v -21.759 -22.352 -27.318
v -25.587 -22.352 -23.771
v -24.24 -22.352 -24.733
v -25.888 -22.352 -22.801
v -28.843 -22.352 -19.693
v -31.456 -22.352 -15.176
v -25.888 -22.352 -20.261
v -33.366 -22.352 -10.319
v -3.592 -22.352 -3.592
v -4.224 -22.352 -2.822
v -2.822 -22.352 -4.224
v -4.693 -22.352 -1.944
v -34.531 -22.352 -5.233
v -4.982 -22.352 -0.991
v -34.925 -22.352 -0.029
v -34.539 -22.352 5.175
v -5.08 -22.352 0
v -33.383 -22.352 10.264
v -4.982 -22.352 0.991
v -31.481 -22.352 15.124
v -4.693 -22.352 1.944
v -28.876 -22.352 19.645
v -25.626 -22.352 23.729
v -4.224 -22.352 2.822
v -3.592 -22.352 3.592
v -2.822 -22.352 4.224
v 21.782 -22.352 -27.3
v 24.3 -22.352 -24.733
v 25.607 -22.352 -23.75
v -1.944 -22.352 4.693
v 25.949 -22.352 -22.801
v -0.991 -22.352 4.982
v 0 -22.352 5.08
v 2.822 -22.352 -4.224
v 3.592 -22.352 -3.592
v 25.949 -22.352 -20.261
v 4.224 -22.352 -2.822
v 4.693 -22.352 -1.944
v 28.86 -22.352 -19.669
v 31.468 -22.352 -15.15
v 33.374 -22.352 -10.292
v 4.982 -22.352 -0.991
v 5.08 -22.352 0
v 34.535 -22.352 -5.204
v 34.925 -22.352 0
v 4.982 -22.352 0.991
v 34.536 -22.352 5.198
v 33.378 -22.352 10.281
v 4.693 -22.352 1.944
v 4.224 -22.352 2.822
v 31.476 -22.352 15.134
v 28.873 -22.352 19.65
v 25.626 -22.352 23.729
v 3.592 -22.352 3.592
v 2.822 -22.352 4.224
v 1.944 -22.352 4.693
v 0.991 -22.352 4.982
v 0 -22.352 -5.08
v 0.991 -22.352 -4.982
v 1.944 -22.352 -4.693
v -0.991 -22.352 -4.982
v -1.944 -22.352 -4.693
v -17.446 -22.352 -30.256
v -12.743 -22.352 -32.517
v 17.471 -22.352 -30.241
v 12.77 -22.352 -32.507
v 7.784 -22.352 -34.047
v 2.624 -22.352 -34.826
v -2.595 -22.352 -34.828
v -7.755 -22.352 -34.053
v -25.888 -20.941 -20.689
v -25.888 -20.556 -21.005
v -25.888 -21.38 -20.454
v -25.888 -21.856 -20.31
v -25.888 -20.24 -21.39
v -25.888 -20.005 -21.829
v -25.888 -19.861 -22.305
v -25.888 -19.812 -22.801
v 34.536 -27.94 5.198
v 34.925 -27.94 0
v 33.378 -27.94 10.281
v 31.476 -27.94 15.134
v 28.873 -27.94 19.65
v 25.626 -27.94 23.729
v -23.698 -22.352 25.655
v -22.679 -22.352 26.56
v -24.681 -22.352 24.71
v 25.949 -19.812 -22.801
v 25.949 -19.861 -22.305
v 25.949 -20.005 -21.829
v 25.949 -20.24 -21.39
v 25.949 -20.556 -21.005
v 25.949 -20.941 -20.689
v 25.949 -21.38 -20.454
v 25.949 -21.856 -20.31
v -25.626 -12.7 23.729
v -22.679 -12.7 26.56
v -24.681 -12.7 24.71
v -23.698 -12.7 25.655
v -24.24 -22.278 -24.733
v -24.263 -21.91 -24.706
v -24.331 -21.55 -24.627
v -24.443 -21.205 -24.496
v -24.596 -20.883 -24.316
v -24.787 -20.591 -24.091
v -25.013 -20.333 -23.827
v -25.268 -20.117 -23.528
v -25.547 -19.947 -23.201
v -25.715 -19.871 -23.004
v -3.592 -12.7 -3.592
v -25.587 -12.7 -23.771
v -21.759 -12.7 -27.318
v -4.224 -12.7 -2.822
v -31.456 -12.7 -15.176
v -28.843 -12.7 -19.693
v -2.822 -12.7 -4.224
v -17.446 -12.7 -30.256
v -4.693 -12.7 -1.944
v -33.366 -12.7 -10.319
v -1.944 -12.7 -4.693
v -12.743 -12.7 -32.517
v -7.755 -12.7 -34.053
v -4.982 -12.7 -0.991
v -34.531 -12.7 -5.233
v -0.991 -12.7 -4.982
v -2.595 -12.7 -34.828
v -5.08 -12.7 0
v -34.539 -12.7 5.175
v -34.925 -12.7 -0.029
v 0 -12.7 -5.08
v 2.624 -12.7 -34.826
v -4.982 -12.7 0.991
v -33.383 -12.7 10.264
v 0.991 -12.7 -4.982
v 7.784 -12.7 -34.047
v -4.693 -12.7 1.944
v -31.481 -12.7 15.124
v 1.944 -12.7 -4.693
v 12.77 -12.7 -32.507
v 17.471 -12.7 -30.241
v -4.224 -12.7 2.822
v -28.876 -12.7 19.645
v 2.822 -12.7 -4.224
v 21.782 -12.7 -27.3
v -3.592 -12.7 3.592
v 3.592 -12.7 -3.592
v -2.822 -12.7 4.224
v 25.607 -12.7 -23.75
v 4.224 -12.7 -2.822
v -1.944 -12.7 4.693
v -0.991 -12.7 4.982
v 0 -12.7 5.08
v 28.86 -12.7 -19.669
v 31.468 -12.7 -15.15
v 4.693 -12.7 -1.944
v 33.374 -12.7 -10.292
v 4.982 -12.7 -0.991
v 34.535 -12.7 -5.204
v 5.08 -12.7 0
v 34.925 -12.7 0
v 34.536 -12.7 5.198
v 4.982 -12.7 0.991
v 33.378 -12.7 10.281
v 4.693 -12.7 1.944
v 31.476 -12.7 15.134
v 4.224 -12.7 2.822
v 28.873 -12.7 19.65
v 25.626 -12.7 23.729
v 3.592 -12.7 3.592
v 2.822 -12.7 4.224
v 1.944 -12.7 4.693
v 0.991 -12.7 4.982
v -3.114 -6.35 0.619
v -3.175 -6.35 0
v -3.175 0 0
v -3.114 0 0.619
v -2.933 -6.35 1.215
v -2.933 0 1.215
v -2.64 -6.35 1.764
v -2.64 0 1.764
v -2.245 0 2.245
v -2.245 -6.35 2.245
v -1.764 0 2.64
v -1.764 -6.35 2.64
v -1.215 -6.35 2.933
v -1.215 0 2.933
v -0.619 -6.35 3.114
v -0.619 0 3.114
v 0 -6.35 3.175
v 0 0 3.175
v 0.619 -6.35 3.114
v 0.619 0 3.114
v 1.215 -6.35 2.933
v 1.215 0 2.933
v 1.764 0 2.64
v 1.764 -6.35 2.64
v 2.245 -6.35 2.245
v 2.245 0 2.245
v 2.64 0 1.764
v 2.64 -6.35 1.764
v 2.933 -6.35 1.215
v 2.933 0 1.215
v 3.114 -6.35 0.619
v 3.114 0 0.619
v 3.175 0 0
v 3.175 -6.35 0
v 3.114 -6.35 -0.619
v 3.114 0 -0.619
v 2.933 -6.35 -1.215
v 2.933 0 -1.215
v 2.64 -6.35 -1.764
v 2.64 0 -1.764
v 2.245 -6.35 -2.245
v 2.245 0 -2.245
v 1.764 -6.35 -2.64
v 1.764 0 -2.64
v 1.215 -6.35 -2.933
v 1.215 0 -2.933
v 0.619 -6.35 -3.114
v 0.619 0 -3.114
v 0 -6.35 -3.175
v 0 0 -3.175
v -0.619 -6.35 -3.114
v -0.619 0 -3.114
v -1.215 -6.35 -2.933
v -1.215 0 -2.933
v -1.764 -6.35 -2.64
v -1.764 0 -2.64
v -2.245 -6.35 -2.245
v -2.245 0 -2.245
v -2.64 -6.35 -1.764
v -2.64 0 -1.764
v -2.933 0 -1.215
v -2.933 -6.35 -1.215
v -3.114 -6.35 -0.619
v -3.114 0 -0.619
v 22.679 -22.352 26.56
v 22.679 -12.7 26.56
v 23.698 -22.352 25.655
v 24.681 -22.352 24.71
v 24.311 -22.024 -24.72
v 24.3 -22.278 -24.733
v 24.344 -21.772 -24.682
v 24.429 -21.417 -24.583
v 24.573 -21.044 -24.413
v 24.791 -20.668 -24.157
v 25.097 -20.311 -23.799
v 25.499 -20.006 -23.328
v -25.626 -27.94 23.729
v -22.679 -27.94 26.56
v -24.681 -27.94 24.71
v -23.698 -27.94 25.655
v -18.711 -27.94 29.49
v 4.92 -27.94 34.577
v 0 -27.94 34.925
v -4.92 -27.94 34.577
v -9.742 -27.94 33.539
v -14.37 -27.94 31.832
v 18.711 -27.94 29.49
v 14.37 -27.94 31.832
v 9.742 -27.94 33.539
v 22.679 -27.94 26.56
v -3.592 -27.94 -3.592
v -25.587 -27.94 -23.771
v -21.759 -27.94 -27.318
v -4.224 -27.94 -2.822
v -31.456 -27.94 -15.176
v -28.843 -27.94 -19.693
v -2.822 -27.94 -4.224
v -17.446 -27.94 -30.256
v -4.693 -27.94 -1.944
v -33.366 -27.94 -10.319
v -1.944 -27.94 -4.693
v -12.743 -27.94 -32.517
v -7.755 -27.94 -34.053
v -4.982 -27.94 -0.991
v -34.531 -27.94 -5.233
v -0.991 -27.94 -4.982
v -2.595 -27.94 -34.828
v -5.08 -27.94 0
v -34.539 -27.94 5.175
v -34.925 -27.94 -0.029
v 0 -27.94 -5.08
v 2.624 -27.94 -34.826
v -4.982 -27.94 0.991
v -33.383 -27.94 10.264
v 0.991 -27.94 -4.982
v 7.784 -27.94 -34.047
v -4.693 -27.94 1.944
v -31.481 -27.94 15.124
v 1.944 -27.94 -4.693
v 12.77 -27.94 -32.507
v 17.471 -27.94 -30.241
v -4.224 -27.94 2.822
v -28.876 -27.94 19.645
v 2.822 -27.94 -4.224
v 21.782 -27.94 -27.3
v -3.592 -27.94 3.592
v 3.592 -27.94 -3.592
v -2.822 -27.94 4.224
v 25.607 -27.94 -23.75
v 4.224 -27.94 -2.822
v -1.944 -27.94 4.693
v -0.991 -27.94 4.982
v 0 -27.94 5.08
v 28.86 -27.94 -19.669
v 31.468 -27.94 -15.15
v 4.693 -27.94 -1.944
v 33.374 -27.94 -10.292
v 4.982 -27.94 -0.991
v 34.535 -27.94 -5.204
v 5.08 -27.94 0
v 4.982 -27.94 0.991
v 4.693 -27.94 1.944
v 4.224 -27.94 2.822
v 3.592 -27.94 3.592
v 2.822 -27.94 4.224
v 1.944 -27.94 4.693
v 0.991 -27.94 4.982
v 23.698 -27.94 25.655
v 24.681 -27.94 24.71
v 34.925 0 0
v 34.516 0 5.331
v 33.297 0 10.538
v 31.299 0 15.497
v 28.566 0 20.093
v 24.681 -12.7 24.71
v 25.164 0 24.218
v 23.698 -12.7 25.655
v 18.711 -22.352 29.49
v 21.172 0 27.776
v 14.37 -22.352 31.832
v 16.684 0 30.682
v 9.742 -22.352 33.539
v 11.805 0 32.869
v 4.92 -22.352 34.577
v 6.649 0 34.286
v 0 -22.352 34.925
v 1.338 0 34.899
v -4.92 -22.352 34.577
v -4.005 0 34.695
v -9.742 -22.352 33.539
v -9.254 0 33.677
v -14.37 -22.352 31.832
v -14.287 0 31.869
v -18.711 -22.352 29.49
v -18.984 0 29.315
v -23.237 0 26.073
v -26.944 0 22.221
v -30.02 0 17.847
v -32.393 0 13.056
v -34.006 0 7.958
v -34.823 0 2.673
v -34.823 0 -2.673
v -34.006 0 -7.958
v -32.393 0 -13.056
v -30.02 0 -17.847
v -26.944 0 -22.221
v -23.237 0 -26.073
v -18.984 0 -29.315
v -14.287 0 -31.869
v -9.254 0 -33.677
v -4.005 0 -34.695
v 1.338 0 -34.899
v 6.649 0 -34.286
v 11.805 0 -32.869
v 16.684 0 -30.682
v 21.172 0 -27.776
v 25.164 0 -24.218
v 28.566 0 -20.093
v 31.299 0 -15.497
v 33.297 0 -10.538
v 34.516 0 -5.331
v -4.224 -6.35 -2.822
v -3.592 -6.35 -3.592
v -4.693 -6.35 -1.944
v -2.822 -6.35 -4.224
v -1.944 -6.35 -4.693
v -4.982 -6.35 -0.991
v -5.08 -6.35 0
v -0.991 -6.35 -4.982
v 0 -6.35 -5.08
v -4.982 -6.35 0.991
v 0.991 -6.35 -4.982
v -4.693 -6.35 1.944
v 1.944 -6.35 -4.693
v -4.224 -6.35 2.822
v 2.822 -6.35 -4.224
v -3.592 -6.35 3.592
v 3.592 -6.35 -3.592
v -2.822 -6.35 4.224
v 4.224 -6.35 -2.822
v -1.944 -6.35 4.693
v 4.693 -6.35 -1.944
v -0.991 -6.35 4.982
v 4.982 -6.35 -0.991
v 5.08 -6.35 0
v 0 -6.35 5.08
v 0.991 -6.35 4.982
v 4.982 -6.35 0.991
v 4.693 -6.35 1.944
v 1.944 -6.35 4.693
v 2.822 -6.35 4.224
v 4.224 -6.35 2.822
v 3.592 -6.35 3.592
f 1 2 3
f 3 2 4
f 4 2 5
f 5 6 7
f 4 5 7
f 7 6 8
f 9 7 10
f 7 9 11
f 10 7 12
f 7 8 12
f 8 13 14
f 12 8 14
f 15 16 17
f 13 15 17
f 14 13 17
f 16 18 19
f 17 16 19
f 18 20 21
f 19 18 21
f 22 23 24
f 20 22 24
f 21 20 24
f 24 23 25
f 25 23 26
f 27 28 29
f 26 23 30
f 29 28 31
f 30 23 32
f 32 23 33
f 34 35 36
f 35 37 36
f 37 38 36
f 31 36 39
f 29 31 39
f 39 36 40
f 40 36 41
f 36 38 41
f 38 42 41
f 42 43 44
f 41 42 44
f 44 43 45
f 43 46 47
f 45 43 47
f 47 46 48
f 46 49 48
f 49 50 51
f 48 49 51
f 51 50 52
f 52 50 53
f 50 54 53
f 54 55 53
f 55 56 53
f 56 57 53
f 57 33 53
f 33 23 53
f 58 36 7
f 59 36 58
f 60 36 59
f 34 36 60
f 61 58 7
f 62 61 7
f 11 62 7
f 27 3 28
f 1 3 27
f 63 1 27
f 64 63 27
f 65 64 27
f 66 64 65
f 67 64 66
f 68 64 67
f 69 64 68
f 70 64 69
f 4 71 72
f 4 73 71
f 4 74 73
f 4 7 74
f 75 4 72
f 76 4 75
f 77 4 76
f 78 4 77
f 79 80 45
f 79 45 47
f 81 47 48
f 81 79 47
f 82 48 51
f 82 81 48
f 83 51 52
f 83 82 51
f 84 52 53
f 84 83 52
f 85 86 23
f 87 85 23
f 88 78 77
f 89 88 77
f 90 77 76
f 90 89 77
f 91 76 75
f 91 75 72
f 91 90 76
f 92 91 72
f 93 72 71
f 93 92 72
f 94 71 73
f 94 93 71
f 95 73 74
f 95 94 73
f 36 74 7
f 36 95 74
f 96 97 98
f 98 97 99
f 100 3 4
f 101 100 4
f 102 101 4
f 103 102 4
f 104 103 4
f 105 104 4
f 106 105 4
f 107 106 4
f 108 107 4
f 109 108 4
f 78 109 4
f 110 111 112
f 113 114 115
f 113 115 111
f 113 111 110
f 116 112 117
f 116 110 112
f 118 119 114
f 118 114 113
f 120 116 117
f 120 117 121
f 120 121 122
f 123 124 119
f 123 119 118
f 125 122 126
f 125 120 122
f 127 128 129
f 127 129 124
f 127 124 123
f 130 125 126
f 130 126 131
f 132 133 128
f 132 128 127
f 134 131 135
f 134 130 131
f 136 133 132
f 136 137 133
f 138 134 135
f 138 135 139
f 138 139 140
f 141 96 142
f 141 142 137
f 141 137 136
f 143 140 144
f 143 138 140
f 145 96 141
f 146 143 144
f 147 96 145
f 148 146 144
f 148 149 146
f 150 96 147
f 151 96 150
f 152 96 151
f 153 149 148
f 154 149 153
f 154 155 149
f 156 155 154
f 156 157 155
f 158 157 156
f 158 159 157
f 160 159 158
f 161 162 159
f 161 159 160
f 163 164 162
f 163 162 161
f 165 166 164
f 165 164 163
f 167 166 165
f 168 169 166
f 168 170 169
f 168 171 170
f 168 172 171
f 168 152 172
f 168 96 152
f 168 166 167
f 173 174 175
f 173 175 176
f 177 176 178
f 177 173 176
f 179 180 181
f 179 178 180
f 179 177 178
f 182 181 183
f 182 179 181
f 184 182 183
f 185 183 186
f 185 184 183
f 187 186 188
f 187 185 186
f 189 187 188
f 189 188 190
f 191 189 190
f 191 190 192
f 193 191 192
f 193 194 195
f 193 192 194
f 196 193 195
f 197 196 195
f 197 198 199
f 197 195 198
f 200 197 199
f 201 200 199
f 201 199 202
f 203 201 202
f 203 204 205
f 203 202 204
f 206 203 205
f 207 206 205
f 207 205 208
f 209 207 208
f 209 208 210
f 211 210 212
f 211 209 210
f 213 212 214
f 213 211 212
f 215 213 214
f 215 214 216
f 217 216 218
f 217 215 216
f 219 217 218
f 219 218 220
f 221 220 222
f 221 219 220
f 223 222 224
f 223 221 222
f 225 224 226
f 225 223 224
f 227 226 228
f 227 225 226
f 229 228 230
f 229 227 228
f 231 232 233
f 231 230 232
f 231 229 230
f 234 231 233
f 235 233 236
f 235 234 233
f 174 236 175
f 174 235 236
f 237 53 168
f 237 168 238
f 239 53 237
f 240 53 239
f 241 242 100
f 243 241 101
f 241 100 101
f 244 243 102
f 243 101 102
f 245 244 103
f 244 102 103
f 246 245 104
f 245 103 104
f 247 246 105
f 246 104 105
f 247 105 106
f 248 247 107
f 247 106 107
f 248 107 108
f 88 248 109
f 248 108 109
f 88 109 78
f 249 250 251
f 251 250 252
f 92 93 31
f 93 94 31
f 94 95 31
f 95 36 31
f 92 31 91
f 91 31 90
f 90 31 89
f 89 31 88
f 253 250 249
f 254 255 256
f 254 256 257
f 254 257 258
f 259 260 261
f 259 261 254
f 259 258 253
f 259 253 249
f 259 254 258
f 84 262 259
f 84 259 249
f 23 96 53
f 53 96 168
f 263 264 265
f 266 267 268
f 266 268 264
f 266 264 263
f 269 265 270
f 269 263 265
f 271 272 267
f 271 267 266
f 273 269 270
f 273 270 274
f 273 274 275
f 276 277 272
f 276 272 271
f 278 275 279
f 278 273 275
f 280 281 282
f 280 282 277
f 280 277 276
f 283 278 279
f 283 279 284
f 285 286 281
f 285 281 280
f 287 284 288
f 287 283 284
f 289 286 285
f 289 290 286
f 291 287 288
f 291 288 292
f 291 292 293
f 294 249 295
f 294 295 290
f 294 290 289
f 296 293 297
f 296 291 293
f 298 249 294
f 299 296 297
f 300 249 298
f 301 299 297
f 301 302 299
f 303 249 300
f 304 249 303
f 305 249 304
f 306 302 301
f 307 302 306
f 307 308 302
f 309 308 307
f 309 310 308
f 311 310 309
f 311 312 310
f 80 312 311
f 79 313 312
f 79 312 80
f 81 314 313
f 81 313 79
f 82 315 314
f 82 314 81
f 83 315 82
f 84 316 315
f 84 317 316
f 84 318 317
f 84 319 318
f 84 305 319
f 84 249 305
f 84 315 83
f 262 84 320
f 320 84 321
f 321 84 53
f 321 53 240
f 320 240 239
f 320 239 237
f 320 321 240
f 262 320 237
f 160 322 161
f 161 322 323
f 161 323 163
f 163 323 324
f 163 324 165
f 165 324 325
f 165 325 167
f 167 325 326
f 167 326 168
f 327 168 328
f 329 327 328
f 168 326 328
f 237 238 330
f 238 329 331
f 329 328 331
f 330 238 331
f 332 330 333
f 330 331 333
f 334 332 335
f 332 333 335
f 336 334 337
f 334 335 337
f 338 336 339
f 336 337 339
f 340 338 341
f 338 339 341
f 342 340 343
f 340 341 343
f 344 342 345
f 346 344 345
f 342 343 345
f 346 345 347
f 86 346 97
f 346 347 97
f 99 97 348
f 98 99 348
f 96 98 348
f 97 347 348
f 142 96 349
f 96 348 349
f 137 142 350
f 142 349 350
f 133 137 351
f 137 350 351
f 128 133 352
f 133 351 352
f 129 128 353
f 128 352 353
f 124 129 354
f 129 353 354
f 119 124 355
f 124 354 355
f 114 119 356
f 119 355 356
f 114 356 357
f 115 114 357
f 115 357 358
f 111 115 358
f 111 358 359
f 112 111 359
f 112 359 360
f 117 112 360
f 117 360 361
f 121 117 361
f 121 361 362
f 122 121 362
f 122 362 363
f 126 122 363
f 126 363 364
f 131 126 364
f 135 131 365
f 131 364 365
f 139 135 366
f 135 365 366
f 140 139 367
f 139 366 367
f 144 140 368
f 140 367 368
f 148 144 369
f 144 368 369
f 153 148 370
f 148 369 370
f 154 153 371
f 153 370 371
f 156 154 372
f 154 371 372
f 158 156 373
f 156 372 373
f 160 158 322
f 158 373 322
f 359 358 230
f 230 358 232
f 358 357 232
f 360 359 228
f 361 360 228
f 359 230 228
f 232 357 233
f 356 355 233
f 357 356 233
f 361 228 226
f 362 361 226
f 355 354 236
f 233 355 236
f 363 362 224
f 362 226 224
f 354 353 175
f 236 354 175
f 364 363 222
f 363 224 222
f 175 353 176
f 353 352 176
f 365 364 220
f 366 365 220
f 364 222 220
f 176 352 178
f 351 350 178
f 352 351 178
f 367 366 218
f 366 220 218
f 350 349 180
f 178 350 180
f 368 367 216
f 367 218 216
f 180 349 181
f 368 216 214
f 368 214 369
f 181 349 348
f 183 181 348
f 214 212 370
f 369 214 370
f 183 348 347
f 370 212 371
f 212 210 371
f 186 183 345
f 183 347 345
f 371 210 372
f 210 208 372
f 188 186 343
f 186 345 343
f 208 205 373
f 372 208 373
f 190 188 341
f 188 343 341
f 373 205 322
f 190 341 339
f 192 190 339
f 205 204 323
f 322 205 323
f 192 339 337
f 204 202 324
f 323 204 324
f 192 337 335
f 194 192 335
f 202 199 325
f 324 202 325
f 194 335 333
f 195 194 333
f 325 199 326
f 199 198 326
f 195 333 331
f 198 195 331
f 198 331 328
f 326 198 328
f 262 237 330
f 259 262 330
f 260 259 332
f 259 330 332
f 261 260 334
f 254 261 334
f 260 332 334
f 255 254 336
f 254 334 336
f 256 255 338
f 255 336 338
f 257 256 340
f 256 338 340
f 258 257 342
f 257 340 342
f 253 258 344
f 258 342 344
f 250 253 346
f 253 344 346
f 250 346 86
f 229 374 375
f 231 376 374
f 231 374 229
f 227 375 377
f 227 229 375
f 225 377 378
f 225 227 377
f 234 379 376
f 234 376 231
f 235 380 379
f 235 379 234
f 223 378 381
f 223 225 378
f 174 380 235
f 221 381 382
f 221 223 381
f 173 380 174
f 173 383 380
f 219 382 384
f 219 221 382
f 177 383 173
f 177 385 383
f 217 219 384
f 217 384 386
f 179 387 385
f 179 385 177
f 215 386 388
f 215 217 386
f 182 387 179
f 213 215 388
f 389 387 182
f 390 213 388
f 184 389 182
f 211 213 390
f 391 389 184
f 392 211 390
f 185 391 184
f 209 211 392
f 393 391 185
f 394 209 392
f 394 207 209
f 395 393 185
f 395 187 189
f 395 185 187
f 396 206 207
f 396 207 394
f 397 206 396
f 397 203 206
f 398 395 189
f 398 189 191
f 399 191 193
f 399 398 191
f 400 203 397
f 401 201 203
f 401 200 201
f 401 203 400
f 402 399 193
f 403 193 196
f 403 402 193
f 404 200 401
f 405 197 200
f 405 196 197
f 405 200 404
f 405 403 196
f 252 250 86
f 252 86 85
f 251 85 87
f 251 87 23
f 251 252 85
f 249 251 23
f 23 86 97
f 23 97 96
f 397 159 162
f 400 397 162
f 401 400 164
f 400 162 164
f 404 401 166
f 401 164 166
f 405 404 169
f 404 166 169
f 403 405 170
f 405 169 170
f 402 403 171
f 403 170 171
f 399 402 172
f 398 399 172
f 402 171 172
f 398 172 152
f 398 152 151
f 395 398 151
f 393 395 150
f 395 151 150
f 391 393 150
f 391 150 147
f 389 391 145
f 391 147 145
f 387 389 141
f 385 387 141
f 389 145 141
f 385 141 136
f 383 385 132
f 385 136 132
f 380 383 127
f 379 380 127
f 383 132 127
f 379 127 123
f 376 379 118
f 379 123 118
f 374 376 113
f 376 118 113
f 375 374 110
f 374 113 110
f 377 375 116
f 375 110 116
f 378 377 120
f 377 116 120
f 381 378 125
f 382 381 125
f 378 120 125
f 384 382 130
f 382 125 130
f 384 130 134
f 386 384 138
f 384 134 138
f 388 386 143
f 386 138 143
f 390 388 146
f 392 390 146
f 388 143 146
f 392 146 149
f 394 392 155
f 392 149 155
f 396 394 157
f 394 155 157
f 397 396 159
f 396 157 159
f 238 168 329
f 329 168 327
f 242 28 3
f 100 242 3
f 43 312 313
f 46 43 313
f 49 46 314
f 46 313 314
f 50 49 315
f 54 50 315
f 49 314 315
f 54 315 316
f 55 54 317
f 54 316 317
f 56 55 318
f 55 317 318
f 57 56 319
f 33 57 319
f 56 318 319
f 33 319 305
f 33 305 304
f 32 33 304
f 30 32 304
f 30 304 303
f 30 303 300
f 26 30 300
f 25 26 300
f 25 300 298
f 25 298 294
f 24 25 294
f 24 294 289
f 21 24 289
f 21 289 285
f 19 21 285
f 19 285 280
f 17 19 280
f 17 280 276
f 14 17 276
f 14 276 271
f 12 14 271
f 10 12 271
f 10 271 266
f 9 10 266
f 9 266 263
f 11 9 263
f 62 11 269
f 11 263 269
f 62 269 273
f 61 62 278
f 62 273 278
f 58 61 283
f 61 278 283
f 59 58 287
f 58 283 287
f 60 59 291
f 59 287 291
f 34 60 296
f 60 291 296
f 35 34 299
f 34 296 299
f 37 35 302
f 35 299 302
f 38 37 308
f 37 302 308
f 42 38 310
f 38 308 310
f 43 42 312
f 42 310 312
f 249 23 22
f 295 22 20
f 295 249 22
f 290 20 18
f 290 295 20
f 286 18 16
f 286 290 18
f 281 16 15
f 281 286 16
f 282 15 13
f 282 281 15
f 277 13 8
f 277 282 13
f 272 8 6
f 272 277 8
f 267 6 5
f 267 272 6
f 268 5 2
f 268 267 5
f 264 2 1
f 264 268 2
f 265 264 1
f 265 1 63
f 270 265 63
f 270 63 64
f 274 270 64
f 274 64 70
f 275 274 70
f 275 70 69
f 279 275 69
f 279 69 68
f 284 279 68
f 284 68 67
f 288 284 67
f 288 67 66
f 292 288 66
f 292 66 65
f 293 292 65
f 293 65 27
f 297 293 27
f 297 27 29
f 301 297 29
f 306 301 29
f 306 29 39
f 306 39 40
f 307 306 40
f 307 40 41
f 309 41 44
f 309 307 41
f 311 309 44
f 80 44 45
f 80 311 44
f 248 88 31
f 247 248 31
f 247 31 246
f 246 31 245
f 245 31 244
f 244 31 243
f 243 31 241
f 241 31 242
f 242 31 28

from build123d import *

# Parameters (mm, degrees)
F0_R         = 34.925
F1_DEPTH     = 12.7
F2_R         = 5.08
F3_DEPTH     = 6.35
F5_DEPTH     = 15.24
F6_DEPTH     = 15.24
F7_R         = 34.925
F8_DEPTH     = 5.588
F9_R         = 5.08
F10_DEPTH    = 6.35
F13_DEPTH    = 2.54
F14_T1_DEPTH = 60.8716457984
F15_DEPTH    = 2.54
F16_R        = 2.53999
F17_R        = 3.175
F18_DEPTH    = 25.4


# Not quite as in the source:
# - a fillet or chamfer that OpenCascade refuses, or shapes differently, is made with other operations: its cross-section is extruded or revolved along the edge and cut away or added
# - a fillet or chamfer is up to 0.001 mm smaller than in the source, because OpenCascade refuses the exact size


with BuildPart() as f1:
    # F0 (on Front) → F1 (new body)
    with BuildSketch(Plane.XZ):
        Circle(F0_R)
    extrude(amount=F1_DEPTH)

    # F2 (on face) → F3 (cut)
    with BuildSketch(Plane.XZ.offset(12.7)):
        Circle(F2_R)
    extrude(amount=-F3_DEPTH, mode=Mode.SUBTRACT)

    # F4 (on face) → F5 (join)
    with BuildSketch(Plane.XZ.offset(12.7)):
        Polygon((22.6792097043, 26.5595382526), (-22.6792097043, 26.5595382526), (-25.6262624144, 23.7286809509), (25.6262624144, 23.7286809509), align=None)
    extrude(amount=F5_DEPTH)

    # F6 (add): a face of the model
    f6_faces = [f1.faces().sort_by_distance(p)[0] for p in [
        (0, -12.7, 29.942642138),
    ]]
    extrude(f6_faces, amount=F6_DEPTH)

    # F7 (on face) → F8 (join)
    with BuildSketch(Plane.XZ.offset(27.94)):
        Circle(F7_R)
    extrude(amount=-F8_DEPTH)

    # F9 (on face) → F10 (cut)
    with BuildSketch(Plane.XZ.offset(27.94)):
        Circle(F9_R)
    extrude(amount=-F10_DEPTH, mode=Mode.SUBTRACT)

    # F12 (on face) → F13 (join)
    with BuildSketch(Plane(origin=(0, -22.352, 0), x_dir=(-1, 0, 0), z_dir=(0, 1, 0))):
        Polygon((-25.9485930492, -22.8007244613), (-24.3002702047, -24.7332440084), (24.2399447162, -24.7332440084), (25.8882675608, -22.8007244613), align=None)
    extrude(amount=F13_DEPTH)

    # F14: fillet of radius 2.54 on 1 edges, made by hand

    # F14_s2 → F14_t1 (cut)
    with BuildSketch(Plane.YZ.offset(-30.405660155)):
        with BuildLine():
            ThreePointArc((-22.2782861755, -24.7332440084), (-20.7116656647, -24.1925689383), (-19.812, -22.8007244613))
            Line((-19.812, -22.8007244613), (-19.812, -24.7332440084))
            Line((-19.812, -24.7332440084), (-22.2782861755, -24.7332440084))
        make_face()
    extrude(amount=F14_T1_DEPTH, mode=Mode.SUBTRACT)

    # F15 (add): a face of the model
    f15_faces = [f1.faces().sort_by_distance(p)[0] for p in [
        (0.0301627442, -21.082, -22.8007244613),
    ]]
    extrude(f15_faces, amount=F15_DEPTH)

    # F16 (radius 2.54 in the source; OpenCascade refuses exactly that, so slightly less here)
    f16_edges = [f1.edges().sort_by_distance(p)[0] for p in [
        (0.030163, -19.812, -20.260724),
    ]]
    fillet(f16_edges, radius=F16_R)

    # F17 (on face) → F18 (cut)
    with BuildSketch(Plane(origin=(0, -22.352, 0), x_dir=(-1, 0, 0), z_dir=(0, 1, 0))):
        Circle(F17_R)
    extrude(amount=F18_DEPTH, mode=Mode.SUBTRACT)


solid = f1.part
